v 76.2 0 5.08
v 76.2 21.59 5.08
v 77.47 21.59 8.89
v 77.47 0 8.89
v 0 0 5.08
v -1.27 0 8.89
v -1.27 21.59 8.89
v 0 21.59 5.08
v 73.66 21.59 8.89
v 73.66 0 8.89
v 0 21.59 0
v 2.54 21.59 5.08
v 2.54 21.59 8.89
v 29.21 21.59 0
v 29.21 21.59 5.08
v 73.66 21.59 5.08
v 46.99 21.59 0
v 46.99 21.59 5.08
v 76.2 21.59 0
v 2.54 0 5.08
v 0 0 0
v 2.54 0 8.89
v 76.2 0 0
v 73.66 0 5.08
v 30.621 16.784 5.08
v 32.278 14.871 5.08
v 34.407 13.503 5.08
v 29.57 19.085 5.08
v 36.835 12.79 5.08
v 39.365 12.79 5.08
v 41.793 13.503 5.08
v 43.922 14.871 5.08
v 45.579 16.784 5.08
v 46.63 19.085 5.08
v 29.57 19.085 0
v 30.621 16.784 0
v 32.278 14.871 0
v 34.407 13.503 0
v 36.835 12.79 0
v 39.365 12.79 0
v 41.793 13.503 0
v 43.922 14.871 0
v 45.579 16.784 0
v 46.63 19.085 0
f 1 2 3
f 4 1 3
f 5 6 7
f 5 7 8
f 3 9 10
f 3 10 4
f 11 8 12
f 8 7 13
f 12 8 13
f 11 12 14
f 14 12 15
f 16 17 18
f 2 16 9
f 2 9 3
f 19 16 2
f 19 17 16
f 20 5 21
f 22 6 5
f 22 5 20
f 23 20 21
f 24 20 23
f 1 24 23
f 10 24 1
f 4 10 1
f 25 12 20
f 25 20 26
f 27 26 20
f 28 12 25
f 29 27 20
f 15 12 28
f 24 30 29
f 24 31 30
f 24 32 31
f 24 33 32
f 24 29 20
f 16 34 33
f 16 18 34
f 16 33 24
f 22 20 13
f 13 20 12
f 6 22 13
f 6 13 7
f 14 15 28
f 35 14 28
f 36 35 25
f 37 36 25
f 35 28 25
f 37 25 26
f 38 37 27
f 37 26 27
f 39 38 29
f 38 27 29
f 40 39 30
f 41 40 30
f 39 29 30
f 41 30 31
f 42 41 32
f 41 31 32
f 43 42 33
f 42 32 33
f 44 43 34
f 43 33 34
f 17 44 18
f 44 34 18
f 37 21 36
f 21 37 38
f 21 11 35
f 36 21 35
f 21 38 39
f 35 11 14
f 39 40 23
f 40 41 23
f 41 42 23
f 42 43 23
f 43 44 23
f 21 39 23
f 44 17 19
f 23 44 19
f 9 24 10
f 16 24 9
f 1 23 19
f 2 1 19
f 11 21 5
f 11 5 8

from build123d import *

# Parameters (mm, degrees)
F0_W     = 76.2
F0_H     = 21.59
F1_DEPTH = 5.08
F2_W     = 2.54
F2_H     = 21.59
F3_DEPTH = 3.81
F5_DEPTH = 25.4
F7_DEPTH = 21.59


# Not quite as in the source:
# - a feature names something its author has since deleted; it is built from what else it names


with BuildPart() as f1:
    # F0 (on Top) → F1 (new body)
    with BuildSketch(Plane.XY):
        with Locations((38.1, 10.795)):
            Rectangle(F0_W, F0_H)
    extrude(amount=F1_DEPTH)

    # F2 (on face) → F3 (join)
    with BuildSketch(Plane.XY.offset(5.08)):
        with Locations((1.27, 10.795)):
            Rectangle(F2_W, F2_H)
        with Locations((74.93, 10.795)):
            Rectangle(F2_W, F2_H)
    extrude(amount=F3_DEPTH)

    # F4 (on face) → F5 (cut)
    with BuildSketch(Plane.XY.offset(5.08)):
        with BuildLine():
            ThreePointArc((29.21, 21.59), (38.1, 12.7), (46.99, 21.59))
            Line((46.99, 21.59), (29.21, 21.59))
        make_face()
        with BuildLine():
            Line((29.21, 21.59), (46.99, 21.59))
            ThreePointArc((46.99, 21.59), (38.1, 30.48), (29.21, 21.59))
        make_face()
    extrude(amount=-F5_DEPTH, mode=Mode.SUBTRACT)

    # F6 (on face) → F7 (join, through all)
    with BuildSketch(Plane.XZ):
        Polygon((0, 5.08), (0, 8.89), (-1.27, 8.89), align=None)
        Polygon((76.2, 8.89), (76.2, 5.08), (77.47, 8.89), align=None)
    extrude(amount=-F7_DEPTH)


solid = f1.part
